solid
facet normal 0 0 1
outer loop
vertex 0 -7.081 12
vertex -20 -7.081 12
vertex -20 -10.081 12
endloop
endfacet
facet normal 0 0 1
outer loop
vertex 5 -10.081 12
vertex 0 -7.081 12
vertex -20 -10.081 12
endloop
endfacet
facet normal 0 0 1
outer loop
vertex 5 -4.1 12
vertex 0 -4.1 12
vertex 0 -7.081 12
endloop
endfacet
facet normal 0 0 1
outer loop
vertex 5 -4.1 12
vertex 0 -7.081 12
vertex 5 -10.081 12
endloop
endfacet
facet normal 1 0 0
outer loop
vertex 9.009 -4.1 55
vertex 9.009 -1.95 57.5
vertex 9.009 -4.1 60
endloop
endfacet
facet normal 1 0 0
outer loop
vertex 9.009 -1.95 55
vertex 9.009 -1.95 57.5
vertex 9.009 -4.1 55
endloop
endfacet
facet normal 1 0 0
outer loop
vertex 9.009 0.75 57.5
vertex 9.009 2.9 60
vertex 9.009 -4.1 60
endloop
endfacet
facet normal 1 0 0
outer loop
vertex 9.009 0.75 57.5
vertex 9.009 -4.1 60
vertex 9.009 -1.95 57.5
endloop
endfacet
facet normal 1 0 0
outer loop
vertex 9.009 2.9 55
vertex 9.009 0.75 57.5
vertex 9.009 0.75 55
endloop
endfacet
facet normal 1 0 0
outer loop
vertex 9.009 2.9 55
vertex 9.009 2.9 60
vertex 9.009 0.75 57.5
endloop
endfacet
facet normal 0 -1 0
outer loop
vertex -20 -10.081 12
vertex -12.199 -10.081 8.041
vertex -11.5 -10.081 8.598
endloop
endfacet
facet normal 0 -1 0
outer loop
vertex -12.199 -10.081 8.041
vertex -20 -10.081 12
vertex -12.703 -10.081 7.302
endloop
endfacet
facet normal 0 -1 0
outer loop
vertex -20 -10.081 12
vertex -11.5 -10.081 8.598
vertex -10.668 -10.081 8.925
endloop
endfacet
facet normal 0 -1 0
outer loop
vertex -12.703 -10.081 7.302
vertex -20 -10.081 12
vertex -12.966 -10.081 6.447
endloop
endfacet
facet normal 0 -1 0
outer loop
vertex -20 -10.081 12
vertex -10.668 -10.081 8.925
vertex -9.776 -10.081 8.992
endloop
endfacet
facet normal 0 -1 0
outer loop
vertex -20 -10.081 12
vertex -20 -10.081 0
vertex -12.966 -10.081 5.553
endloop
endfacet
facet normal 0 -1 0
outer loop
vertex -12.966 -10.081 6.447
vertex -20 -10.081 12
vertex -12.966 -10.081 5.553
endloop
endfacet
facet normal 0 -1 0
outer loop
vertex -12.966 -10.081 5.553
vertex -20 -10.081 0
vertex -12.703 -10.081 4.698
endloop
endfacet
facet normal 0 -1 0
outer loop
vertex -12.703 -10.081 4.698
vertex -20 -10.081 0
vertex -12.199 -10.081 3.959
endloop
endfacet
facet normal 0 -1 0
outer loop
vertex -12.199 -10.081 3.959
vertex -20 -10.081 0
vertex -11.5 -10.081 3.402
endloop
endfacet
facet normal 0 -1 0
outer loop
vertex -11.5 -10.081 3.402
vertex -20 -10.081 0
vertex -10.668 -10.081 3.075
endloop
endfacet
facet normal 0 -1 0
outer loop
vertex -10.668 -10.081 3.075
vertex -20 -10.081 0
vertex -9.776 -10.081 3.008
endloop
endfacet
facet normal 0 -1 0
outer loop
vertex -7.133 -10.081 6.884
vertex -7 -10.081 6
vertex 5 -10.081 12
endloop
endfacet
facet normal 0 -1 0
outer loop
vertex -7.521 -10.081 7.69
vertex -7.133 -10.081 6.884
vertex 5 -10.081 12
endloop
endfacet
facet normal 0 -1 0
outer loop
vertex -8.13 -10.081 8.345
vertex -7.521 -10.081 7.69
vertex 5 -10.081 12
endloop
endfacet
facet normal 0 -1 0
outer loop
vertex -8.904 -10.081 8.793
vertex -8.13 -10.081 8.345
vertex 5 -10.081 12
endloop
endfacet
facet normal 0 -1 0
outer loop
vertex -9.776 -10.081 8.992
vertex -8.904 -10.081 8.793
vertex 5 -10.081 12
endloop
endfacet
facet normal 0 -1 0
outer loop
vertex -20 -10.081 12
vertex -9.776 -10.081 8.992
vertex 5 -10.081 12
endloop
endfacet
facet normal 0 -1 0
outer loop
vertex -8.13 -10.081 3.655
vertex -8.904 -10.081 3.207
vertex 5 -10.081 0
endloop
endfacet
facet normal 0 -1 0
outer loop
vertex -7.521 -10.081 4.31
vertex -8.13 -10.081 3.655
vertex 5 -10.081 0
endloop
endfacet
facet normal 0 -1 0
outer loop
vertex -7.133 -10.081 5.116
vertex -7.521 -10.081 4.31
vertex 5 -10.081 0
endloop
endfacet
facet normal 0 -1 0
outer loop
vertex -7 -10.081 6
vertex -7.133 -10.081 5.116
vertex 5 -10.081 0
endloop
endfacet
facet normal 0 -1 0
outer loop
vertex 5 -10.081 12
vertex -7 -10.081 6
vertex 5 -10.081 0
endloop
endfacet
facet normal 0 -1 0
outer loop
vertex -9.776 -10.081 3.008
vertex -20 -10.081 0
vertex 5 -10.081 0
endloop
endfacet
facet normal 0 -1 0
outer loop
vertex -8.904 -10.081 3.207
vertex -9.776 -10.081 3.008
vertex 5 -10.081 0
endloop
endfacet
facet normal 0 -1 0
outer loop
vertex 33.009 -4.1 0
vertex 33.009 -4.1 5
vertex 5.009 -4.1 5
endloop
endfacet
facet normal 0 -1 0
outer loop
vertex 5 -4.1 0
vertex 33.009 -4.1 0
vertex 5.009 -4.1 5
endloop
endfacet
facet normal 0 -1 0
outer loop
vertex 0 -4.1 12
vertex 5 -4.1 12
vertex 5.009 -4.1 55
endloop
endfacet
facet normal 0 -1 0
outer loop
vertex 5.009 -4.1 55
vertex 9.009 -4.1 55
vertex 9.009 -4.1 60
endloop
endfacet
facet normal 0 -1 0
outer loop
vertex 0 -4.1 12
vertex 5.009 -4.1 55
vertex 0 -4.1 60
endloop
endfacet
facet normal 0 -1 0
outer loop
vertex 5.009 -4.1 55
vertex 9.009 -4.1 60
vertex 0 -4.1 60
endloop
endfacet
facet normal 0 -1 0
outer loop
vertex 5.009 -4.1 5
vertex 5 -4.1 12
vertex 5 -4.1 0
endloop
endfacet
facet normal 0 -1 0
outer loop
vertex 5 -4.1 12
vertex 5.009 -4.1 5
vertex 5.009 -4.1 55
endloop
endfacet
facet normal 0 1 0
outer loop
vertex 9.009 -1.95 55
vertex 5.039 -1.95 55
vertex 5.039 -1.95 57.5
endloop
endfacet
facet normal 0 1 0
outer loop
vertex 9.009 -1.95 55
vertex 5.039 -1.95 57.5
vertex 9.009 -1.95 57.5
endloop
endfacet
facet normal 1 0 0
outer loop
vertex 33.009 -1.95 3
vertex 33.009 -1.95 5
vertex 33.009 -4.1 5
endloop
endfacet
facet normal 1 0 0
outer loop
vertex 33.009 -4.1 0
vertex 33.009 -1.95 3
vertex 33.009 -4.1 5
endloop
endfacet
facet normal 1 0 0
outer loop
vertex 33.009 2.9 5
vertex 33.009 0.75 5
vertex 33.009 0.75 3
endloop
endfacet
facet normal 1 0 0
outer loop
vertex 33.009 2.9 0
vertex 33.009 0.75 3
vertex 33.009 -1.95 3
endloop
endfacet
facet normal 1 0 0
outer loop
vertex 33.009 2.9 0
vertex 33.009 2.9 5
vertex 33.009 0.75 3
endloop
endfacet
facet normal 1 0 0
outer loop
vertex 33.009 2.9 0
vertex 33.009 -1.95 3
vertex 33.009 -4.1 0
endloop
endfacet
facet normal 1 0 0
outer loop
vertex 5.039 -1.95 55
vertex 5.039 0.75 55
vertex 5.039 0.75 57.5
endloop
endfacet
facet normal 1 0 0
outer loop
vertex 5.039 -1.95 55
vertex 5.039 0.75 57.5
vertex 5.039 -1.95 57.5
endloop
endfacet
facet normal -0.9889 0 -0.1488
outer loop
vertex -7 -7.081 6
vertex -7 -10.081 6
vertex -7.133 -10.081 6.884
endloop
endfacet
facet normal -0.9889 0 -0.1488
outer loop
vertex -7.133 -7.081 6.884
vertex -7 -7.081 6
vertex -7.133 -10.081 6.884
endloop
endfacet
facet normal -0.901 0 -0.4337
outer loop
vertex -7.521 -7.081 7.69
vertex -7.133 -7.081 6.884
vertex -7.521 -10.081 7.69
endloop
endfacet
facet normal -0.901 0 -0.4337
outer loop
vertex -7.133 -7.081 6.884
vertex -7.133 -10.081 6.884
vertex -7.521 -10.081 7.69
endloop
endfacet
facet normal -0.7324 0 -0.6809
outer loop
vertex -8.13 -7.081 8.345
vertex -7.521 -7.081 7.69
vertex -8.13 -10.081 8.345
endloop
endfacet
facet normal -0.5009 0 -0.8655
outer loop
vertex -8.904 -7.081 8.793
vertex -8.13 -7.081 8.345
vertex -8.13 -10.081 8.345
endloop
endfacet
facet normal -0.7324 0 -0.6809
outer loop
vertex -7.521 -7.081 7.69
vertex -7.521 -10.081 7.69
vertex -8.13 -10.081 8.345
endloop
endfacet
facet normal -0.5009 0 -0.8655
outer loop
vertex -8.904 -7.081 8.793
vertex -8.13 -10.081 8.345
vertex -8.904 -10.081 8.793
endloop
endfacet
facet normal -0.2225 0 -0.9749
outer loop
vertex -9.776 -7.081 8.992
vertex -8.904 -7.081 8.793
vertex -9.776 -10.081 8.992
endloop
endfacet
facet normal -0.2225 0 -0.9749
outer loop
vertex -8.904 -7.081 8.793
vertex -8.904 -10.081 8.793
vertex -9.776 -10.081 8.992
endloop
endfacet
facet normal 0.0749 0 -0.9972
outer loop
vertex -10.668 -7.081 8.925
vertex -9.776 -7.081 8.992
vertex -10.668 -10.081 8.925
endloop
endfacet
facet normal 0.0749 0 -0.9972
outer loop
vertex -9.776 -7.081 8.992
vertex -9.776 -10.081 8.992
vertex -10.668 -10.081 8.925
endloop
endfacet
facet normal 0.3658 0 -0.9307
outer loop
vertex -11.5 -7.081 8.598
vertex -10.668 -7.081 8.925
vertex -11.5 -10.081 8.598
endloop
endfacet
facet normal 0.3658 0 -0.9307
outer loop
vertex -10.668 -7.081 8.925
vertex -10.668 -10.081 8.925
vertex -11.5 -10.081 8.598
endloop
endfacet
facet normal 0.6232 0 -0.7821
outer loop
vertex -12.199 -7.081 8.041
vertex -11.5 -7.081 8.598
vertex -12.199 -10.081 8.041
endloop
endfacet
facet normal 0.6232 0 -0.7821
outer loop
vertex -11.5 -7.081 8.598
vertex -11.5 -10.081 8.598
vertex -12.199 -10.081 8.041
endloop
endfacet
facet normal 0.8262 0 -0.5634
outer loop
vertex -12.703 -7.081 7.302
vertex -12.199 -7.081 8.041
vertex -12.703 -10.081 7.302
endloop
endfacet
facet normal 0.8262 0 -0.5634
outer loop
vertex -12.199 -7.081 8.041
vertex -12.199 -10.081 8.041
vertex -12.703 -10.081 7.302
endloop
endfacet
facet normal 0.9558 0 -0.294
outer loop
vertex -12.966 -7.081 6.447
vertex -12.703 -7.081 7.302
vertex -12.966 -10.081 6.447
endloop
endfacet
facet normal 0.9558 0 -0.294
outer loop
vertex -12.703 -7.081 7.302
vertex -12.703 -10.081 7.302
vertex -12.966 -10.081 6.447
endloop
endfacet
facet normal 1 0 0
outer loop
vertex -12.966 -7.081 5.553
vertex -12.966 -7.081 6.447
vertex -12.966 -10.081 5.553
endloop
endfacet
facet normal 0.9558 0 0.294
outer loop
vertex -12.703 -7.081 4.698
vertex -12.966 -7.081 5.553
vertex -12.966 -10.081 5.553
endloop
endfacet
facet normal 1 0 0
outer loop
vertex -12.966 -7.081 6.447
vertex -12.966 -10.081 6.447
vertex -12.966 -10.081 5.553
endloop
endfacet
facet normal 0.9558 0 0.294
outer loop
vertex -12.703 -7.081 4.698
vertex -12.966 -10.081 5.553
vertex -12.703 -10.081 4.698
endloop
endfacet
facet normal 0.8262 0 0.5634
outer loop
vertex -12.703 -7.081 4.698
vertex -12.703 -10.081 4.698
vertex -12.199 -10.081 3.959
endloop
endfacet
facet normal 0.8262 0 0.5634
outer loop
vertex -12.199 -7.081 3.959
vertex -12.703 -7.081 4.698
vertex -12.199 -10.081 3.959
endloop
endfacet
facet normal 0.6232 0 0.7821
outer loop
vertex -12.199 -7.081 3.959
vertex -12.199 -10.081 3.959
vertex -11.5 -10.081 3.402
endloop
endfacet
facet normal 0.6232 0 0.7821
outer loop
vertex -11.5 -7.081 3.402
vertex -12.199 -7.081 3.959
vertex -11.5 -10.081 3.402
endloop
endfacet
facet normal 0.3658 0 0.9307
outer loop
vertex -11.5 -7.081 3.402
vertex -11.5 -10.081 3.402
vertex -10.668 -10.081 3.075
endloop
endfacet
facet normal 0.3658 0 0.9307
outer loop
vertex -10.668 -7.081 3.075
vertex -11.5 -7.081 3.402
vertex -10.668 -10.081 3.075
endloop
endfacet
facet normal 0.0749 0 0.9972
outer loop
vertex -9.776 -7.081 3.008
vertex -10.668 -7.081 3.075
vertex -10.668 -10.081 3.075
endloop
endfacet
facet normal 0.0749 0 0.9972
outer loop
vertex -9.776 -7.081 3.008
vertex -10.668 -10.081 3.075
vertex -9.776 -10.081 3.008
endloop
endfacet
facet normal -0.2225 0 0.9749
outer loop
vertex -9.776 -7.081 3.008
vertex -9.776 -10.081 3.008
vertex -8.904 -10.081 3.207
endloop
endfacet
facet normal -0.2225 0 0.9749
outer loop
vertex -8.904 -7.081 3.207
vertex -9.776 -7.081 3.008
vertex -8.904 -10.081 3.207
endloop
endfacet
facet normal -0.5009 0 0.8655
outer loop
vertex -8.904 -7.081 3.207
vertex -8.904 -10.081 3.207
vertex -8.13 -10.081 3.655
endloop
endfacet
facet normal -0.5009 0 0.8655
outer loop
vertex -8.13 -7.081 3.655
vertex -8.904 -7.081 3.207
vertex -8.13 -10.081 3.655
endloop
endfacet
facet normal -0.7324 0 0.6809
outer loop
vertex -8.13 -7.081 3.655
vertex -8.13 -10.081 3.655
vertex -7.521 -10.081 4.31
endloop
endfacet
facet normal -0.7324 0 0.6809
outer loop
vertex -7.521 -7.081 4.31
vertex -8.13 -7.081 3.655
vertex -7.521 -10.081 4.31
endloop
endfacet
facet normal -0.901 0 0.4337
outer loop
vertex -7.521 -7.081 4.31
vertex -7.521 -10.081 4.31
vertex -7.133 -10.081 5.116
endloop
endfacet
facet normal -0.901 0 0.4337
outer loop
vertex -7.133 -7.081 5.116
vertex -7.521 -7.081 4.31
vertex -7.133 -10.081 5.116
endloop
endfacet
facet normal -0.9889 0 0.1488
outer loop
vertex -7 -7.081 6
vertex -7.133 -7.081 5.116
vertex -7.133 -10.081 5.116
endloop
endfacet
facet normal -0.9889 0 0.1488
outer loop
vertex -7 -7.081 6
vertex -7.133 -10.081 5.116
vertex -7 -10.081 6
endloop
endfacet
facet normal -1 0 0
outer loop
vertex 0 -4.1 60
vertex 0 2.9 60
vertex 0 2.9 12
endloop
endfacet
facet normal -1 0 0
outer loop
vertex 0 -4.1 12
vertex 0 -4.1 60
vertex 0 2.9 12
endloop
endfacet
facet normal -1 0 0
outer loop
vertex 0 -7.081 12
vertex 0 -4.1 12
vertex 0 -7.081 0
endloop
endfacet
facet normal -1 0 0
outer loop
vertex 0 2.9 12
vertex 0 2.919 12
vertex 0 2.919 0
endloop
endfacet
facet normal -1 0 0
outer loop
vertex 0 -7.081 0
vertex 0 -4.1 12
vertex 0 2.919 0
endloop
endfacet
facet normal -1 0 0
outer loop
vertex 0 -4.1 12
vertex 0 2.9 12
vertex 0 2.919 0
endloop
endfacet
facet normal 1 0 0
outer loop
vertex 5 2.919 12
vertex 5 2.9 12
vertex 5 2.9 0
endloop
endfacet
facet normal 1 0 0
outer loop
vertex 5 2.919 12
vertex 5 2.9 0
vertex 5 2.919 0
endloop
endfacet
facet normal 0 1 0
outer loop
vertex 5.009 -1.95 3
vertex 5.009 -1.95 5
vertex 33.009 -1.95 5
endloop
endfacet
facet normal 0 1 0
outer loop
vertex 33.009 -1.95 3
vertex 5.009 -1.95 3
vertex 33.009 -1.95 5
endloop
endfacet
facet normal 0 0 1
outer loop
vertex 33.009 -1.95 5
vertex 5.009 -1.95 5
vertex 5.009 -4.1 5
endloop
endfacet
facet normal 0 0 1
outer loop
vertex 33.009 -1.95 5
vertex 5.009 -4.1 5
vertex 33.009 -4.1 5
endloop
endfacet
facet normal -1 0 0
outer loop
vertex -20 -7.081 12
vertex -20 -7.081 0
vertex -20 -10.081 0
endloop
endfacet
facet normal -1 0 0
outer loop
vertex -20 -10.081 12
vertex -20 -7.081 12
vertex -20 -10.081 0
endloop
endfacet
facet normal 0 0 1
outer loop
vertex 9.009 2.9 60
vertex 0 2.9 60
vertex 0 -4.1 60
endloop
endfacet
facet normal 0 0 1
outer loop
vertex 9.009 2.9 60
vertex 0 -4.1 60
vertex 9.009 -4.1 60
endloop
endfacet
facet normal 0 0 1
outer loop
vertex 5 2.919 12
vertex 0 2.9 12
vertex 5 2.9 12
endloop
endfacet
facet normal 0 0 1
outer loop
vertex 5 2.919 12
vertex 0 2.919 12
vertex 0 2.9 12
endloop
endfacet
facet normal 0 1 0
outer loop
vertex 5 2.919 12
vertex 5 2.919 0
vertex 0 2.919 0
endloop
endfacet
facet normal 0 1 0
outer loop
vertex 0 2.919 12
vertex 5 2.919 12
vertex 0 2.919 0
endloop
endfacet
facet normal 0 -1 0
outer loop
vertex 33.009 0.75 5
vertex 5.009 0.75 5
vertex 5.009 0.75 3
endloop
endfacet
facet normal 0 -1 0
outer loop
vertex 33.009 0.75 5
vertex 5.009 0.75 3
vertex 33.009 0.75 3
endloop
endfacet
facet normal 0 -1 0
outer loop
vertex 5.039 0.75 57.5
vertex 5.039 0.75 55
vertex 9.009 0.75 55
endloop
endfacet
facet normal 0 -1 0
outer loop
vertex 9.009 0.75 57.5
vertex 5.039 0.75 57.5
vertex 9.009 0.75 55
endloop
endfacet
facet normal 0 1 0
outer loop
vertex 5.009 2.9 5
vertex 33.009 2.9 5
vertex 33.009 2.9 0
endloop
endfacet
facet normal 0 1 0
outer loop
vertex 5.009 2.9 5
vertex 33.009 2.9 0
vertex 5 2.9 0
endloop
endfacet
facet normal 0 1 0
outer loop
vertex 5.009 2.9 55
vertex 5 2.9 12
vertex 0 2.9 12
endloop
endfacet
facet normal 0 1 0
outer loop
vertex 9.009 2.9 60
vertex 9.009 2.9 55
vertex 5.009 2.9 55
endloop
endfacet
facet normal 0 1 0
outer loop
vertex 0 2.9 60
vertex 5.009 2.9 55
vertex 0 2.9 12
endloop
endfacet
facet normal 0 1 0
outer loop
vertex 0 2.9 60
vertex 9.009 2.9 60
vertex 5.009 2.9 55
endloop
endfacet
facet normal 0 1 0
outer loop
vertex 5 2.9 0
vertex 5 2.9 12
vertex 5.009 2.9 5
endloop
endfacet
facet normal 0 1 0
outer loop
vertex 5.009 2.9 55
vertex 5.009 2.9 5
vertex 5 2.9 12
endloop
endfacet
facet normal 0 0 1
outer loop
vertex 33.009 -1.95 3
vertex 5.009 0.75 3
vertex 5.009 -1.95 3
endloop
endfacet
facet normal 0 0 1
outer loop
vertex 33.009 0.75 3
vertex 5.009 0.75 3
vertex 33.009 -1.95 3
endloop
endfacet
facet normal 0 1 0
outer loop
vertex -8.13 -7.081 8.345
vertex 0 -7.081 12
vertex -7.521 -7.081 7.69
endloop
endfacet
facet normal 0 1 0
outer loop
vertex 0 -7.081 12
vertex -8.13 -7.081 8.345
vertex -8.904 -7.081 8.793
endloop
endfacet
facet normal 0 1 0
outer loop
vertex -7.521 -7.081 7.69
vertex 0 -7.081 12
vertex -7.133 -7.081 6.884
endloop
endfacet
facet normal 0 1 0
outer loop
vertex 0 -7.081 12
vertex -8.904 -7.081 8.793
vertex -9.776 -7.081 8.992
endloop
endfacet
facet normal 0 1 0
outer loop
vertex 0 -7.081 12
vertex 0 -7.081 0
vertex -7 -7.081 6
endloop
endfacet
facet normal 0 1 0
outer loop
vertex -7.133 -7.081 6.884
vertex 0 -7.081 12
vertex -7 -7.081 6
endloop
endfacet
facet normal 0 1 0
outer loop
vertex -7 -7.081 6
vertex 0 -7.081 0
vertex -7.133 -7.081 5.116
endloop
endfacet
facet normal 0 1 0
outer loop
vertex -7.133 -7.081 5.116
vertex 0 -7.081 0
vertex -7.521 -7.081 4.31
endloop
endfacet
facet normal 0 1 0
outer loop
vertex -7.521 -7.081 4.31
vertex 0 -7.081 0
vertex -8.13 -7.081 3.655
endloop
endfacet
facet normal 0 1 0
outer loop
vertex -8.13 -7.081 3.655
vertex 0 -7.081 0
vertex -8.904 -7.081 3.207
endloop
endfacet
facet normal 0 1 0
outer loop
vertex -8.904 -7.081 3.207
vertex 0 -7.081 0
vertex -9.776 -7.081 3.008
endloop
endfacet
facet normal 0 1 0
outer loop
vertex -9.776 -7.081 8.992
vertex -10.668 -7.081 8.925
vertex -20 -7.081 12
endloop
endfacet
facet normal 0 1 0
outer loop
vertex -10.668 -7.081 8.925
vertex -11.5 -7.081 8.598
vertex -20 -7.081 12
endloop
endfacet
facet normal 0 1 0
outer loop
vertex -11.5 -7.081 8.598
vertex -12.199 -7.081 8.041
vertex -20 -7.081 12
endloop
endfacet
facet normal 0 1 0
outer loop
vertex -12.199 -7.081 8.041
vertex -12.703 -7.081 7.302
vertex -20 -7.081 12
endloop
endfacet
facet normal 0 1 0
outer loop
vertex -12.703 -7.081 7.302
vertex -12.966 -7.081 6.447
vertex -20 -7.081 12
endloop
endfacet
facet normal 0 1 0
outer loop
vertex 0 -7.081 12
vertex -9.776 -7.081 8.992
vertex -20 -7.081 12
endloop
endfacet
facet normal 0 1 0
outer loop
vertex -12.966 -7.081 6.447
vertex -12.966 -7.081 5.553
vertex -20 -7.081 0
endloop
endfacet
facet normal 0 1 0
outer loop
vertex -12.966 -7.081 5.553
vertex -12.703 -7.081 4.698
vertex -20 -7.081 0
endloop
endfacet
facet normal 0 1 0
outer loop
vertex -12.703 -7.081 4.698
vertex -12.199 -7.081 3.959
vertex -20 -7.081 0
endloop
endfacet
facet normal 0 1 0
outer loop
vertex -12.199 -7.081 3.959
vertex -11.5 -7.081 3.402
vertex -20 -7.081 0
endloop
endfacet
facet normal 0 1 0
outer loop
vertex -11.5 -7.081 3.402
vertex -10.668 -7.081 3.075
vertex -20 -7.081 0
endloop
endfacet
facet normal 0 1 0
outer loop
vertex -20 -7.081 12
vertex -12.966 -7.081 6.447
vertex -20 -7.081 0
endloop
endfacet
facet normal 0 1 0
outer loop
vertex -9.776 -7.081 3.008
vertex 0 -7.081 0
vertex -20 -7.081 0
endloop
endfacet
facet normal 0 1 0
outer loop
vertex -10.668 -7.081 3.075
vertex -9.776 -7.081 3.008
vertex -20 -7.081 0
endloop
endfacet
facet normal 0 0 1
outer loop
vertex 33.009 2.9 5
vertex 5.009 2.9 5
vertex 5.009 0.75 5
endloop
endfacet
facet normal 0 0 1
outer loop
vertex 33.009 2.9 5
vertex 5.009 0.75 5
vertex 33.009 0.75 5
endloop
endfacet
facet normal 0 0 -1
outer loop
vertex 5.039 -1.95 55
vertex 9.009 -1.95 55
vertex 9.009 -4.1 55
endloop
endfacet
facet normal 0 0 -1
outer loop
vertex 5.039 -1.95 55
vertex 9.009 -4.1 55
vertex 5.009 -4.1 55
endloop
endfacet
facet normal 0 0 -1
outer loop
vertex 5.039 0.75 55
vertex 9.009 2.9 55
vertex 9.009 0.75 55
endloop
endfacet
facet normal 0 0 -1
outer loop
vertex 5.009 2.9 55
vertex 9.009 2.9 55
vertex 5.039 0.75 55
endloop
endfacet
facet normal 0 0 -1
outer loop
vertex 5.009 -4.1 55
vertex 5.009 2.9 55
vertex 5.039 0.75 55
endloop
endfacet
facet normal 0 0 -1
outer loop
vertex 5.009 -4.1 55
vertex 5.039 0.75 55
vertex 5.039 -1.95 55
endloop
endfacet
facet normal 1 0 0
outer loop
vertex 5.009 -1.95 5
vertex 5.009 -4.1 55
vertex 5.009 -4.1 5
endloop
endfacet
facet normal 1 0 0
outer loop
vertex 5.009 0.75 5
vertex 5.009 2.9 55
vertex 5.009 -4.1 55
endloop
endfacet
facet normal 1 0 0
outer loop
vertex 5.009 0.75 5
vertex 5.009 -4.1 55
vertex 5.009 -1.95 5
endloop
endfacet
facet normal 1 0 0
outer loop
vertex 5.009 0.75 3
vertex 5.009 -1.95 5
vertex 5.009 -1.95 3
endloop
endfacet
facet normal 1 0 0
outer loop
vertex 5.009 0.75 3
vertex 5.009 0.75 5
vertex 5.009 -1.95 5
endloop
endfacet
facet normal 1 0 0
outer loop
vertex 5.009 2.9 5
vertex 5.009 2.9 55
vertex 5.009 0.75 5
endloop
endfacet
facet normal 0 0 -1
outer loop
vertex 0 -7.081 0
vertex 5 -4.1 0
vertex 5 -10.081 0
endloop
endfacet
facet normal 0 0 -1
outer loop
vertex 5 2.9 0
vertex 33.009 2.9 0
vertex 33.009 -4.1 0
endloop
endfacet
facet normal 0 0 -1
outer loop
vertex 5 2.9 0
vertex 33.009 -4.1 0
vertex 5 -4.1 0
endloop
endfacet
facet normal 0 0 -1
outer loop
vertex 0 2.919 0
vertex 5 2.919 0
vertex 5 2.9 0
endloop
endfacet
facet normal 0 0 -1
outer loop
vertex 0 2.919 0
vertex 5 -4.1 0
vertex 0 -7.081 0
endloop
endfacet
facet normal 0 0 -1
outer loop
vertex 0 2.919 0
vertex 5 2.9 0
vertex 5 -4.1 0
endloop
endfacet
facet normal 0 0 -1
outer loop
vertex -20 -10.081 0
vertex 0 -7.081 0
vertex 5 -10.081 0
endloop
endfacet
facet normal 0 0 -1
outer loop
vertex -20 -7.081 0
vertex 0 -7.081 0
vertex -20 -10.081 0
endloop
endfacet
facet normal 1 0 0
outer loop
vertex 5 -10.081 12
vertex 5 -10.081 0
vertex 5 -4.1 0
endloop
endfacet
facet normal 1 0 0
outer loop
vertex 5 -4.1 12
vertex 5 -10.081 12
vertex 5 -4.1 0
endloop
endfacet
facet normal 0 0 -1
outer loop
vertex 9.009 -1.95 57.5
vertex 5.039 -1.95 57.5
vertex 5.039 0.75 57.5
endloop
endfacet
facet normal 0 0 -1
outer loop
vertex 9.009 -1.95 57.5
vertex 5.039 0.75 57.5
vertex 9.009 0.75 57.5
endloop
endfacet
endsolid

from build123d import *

# Parameters (mm, degrees)
PAD_DEPTH       = 12
SKETCH001_R     = 3
HOLE_DEPTH      = 13.001
PAD001_DEPTH    = 7
SKETCH003_W     = 28
SKETCH003_H     = 2.7
POCKET_DEPTH    = 2
SKETCH004_W     = 4
SKETCH004_H     = 2.7
POCKET001_DEPTH = 2.5


with BuildPart() as part:
    # Sketch → Pad (new body)
    with BuildSketch(Plane.XY):
        Polygon((-20, -10.081048), (5, -10.081048), (5, 2.918952), (0, 2.918952), (0, -7.081048), (-20, -7.081048), align=None)
    extrude(amount=PAD_DEPTH)

    # Sketch001 (on Face1 of Pad) → Hole (cut, through all)
    with BuildSketch(Plane.XZ.offset(10.081048)):
        with Locations((-10, 6)):
            Circle(SKETCH001_R)
    extrude(amount=-HOLE_DEPTH, mode=Mode.SUBTRACT)

    # Sketch002 → Pad001 (join)
    with BuildSketch(Plane.XZ.offset(-2.9)):
        Polygon((33.008904, 5), (33.008904, 0), (0, 0), (0, 11.991246), (0, 60), (9.008904, 60), (9.008904, 55), (5.008904, 55), (5.008904, 5), align=None)
    extrude(amount=PAD001_DEPTH)

    # Sketch003 (on Face15 of Pad001) → Pocket (cut)
    with BuildSketch(Plane(origin=(0, -6, 5), x_dir=(1, 0, 0), z_dir=(0, 0, 1))):
        with Locations((19.008904, 5.4)):
            Rectangle(SKETCH003_W, SKETCH003_H)
    extrude(amount=-POCKET_DEPTH, mode=Mode.SUBTRACT)

    # Sketch004 (on Face17 of Pocket) → Pocket001 (cut)
    with BuildSketch(Plane(origin=(54, 23, 55), x_dir=(1, 0, 0), z_dir=(0, 0, -1))):
        with Locations((-46.961428, 23.6)):
            Rectangle(SKETCH004_W, SKETCH004_H)
    extrude(amount=-POCKET001_DEPTH, mode=Mode.SUBTRACT)


solid = part.part
